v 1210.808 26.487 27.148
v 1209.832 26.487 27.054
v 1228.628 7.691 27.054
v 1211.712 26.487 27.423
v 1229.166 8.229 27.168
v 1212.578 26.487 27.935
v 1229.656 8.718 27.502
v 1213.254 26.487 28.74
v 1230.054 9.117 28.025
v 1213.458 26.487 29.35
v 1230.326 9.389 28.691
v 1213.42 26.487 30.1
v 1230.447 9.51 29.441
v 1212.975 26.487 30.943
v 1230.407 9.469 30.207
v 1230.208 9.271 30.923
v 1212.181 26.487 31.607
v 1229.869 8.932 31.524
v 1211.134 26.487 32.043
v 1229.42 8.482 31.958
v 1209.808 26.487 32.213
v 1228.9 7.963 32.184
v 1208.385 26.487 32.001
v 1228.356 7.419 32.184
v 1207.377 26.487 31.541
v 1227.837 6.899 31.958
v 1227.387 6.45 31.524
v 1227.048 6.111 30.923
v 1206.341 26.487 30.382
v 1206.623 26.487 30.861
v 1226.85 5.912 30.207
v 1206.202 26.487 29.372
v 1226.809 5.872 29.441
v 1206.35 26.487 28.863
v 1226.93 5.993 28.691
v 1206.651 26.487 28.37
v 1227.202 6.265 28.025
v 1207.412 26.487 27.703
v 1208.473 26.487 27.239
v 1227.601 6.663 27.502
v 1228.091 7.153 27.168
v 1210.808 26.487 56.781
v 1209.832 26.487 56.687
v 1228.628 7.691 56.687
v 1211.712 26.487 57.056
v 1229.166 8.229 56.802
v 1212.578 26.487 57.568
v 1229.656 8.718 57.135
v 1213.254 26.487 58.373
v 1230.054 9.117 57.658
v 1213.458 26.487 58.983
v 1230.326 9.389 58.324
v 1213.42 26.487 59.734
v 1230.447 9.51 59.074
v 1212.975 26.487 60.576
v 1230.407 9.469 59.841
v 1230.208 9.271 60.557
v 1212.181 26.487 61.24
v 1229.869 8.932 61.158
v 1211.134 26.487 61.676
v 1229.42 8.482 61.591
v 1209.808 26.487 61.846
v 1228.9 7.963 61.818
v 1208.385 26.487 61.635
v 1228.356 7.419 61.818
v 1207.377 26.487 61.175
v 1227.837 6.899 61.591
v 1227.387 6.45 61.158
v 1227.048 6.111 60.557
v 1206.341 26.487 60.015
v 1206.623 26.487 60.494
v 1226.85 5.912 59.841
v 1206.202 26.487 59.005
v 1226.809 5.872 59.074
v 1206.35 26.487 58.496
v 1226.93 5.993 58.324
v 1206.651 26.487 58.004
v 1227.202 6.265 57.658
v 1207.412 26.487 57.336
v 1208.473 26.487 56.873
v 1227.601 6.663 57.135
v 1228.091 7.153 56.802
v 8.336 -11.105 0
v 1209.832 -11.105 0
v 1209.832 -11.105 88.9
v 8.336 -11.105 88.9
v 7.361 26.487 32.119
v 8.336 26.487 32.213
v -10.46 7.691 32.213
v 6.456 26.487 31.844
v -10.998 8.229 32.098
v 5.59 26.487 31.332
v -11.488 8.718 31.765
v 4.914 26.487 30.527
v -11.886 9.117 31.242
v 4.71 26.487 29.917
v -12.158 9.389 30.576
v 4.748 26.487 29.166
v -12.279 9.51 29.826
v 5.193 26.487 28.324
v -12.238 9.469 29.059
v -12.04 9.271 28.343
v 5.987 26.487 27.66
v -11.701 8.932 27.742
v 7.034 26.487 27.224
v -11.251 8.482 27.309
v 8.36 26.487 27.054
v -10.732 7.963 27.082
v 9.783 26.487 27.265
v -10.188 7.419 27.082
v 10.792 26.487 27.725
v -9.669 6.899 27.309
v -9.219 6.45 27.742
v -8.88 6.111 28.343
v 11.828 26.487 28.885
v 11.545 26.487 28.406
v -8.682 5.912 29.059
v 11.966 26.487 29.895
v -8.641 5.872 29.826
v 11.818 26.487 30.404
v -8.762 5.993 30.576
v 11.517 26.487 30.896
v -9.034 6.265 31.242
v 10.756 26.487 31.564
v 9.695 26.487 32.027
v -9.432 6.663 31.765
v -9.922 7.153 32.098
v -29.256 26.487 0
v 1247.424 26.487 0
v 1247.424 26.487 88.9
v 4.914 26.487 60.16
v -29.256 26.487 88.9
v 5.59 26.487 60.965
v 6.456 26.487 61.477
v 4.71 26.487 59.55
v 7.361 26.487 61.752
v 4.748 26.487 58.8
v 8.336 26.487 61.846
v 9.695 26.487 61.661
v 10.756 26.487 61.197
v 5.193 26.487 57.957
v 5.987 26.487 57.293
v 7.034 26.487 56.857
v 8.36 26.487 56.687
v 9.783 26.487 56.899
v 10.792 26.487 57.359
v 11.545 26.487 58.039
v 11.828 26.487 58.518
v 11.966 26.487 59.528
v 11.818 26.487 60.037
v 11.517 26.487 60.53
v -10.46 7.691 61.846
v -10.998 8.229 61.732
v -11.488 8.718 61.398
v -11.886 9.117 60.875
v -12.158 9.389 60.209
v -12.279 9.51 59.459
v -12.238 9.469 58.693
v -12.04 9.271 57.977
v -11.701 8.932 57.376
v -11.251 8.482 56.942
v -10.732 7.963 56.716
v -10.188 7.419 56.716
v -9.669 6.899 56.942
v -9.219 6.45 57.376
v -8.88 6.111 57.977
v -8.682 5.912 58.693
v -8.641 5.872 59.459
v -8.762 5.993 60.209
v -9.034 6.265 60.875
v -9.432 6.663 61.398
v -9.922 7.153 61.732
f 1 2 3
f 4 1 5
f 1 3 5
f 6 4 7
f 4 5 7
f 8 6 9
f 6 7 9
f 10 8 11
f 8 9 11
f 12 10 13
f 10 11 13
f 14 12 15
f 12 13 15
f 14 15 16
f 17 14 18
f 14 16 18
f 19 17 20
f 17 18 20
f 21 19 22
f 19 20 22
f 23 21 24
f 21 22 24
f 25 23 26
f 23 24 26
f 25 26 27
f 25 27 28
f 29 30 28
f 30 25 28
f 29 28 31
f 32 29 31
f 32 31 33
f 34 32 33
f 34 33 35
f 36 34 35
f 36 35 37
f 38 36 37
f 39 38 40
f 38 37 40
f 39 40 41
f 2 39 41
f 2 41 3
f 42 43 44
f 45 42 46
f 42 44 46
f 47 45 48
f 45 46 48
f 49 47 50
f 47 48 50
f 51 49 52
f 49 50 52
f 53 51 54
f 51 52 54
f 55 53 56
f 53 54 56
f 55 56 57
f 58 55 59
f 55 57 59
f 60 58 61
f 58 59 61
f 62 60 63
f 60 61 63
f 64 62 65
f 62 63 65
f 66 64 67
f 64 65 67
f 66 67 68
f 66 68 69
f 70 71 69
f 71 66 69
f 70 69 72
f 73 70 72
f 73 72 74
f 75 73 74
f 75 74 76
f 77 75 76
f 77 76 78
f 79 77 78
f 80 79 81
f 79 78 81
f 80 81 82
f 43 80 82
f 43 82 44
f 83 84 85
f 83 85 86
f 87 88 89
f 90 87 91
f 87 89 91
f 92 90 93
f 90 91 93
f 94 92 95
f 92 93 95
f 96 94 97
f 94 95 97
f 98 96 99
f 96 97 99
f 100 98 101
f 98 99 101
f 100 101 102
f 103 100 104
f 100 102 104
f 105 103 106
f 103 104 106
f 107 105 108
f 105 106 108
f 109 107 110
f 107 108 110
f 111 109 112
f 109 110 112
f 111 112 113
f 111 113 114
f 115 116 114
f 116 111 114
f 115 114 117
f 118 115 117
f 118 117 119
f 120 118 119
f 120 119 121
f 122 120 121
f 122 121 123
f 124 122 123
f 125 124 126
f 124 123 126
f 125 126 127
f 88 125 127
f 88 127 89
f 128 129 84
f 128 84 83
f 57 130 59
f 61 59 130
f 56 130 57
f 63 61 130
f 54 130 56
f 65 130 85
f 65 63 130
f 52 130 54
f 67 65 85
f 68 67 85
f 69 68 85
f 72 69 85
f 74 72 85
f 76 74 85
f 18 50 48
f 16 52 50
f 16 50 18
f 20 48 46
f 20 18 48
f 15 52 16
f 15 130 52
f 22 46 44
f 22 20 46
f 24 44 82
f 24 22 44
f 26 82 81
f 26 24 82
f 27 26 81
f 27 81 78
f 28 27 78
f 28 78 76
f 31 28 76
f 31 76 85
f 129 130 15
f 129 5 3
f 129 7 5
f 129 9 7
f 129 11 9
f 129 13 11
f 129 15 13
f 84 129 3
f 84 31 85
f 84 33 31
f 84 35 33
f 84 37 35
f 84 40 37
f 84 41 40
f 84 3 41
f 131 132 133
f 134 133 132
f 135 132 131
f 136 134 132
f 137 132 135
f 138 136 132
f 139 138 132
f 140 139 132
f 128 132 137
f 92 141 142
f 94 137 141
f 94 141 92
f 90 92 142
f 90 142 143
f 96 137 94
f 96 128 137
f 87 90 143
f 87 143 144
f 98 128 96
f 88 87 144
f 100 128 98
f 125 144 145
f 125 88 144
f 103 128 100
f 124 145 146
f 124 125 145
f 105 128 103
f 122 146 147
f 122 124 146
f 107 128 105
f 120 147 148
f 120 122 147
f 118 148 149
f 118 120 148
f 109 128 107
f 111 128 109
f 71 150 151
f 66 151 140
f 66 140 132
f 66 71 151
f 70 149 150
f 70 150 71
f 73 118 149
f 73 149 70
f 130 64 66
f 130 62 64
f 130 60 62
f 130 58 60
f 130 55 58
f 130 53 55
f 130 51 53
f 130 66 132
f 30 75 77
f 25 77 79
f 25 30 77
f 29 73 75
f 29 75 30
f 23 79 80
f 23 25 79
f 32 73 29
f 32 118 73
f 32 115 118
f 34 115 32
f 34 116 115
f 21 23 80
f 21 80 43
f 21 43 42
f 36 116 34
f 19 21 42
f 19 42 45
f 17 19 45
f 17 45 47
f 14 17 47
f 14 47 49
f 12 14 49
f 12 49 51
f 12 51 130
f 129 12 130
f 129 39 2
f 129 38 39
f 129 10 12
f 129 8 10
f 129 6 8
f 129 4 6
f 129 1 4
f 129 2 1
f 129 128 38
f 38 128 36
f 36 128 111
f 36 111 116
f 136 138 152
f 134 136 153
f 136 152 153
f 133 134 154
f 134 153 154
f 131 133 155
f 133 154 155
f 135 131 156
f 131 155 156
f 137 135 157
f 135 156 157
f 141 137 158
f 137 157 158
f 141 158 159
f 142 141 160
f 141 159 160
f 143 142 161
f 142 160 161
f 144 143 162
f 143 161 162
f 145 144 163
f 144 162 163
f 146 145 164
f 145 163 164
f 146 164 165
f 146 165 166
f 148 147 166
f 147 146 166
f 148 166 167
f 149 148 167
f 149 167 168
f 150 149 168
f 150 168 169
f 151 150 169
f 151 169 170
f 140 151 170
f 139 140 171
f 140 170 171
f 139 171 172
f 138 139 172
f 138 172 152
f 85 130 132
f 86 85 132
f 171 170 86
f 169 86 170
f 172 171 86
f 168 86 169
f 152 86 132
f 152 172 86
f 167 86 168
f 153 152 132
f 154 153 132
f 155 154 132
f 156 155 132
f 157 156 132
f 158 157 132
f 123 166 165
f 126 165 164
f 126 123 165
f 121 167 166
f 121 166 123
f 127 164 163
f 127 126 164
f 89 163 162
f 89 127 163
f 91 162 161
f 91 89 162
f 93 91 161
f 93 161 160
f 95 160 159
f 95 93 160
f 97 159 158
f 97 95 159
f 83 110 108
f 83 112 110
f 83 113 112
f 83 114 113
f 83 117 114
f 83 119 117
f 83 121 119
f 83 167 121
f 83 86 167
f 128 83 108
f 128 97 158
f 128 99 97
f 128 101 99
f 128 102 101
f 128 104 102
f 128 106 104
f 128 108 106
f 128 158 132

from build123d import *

# Parameters (mm, degrees)
BOSS_EXTRUDE1_DEPTH = 88.9
SKETCH2_R           = 2.5796875
CUT_EXTRUDE1_DEPTH  = 903.74963352
SKETCH3_R           = 2.5796875
CUT_EXTRUDE2_DEPTH  = 903.74963352


with BuildPart() as part:
    # Sketch1 → Boss-Extrude1 (new body)
    with BuildSketch(Plane.XY):
        Polygon((-29.256301488, 26.487163625), (1247.424473663, 26.487163625), (1209.831898512, -11.105411527), (8.336273663, -11.105411527), align=None)
    extrude(amount=BOSS_EXTRUDE1_DEPTH)

    # Sketch2 → Cut-Extrude1 (cut, through all)
    with BuildSketch(Plane(origin=(-1.384568932, -1.384568932, 0), x_dir=(0, 0, 1), z_dir=(-0.707106781, -0.707106781, 0))):
        with Locations((29.633333333, 12.834617376)):
            Circle(SKETCH2_R)
        with Locations((59.266666667, 12.834617376)):
            Circle(SKETCH2_R)
    extrude(amount=-CUT_EXTRUDE1_DEPTH, mode=Mode.SUBTRACT)

    # Sketch3 → Cut-Extrude2 (cut, through all)
    with BuildSketch(Plane(origin=(610.468655019, -610.468655019, 0), x_dir=(0, 0, -1), z_dir=(0.707106781, -0.707106781, 0))):
        with Locations((-59.266666667, 874.209592547)):
            Circle(SKETCH3_R)
        with Locations((-29.633333333, 874.209592547)):
            Circle(SKETCH3_R)
    extrude(amount=-CUT_EXTRUDE2_DEPTH, mode=Mode.SUBTRACT)


solid = part.part
